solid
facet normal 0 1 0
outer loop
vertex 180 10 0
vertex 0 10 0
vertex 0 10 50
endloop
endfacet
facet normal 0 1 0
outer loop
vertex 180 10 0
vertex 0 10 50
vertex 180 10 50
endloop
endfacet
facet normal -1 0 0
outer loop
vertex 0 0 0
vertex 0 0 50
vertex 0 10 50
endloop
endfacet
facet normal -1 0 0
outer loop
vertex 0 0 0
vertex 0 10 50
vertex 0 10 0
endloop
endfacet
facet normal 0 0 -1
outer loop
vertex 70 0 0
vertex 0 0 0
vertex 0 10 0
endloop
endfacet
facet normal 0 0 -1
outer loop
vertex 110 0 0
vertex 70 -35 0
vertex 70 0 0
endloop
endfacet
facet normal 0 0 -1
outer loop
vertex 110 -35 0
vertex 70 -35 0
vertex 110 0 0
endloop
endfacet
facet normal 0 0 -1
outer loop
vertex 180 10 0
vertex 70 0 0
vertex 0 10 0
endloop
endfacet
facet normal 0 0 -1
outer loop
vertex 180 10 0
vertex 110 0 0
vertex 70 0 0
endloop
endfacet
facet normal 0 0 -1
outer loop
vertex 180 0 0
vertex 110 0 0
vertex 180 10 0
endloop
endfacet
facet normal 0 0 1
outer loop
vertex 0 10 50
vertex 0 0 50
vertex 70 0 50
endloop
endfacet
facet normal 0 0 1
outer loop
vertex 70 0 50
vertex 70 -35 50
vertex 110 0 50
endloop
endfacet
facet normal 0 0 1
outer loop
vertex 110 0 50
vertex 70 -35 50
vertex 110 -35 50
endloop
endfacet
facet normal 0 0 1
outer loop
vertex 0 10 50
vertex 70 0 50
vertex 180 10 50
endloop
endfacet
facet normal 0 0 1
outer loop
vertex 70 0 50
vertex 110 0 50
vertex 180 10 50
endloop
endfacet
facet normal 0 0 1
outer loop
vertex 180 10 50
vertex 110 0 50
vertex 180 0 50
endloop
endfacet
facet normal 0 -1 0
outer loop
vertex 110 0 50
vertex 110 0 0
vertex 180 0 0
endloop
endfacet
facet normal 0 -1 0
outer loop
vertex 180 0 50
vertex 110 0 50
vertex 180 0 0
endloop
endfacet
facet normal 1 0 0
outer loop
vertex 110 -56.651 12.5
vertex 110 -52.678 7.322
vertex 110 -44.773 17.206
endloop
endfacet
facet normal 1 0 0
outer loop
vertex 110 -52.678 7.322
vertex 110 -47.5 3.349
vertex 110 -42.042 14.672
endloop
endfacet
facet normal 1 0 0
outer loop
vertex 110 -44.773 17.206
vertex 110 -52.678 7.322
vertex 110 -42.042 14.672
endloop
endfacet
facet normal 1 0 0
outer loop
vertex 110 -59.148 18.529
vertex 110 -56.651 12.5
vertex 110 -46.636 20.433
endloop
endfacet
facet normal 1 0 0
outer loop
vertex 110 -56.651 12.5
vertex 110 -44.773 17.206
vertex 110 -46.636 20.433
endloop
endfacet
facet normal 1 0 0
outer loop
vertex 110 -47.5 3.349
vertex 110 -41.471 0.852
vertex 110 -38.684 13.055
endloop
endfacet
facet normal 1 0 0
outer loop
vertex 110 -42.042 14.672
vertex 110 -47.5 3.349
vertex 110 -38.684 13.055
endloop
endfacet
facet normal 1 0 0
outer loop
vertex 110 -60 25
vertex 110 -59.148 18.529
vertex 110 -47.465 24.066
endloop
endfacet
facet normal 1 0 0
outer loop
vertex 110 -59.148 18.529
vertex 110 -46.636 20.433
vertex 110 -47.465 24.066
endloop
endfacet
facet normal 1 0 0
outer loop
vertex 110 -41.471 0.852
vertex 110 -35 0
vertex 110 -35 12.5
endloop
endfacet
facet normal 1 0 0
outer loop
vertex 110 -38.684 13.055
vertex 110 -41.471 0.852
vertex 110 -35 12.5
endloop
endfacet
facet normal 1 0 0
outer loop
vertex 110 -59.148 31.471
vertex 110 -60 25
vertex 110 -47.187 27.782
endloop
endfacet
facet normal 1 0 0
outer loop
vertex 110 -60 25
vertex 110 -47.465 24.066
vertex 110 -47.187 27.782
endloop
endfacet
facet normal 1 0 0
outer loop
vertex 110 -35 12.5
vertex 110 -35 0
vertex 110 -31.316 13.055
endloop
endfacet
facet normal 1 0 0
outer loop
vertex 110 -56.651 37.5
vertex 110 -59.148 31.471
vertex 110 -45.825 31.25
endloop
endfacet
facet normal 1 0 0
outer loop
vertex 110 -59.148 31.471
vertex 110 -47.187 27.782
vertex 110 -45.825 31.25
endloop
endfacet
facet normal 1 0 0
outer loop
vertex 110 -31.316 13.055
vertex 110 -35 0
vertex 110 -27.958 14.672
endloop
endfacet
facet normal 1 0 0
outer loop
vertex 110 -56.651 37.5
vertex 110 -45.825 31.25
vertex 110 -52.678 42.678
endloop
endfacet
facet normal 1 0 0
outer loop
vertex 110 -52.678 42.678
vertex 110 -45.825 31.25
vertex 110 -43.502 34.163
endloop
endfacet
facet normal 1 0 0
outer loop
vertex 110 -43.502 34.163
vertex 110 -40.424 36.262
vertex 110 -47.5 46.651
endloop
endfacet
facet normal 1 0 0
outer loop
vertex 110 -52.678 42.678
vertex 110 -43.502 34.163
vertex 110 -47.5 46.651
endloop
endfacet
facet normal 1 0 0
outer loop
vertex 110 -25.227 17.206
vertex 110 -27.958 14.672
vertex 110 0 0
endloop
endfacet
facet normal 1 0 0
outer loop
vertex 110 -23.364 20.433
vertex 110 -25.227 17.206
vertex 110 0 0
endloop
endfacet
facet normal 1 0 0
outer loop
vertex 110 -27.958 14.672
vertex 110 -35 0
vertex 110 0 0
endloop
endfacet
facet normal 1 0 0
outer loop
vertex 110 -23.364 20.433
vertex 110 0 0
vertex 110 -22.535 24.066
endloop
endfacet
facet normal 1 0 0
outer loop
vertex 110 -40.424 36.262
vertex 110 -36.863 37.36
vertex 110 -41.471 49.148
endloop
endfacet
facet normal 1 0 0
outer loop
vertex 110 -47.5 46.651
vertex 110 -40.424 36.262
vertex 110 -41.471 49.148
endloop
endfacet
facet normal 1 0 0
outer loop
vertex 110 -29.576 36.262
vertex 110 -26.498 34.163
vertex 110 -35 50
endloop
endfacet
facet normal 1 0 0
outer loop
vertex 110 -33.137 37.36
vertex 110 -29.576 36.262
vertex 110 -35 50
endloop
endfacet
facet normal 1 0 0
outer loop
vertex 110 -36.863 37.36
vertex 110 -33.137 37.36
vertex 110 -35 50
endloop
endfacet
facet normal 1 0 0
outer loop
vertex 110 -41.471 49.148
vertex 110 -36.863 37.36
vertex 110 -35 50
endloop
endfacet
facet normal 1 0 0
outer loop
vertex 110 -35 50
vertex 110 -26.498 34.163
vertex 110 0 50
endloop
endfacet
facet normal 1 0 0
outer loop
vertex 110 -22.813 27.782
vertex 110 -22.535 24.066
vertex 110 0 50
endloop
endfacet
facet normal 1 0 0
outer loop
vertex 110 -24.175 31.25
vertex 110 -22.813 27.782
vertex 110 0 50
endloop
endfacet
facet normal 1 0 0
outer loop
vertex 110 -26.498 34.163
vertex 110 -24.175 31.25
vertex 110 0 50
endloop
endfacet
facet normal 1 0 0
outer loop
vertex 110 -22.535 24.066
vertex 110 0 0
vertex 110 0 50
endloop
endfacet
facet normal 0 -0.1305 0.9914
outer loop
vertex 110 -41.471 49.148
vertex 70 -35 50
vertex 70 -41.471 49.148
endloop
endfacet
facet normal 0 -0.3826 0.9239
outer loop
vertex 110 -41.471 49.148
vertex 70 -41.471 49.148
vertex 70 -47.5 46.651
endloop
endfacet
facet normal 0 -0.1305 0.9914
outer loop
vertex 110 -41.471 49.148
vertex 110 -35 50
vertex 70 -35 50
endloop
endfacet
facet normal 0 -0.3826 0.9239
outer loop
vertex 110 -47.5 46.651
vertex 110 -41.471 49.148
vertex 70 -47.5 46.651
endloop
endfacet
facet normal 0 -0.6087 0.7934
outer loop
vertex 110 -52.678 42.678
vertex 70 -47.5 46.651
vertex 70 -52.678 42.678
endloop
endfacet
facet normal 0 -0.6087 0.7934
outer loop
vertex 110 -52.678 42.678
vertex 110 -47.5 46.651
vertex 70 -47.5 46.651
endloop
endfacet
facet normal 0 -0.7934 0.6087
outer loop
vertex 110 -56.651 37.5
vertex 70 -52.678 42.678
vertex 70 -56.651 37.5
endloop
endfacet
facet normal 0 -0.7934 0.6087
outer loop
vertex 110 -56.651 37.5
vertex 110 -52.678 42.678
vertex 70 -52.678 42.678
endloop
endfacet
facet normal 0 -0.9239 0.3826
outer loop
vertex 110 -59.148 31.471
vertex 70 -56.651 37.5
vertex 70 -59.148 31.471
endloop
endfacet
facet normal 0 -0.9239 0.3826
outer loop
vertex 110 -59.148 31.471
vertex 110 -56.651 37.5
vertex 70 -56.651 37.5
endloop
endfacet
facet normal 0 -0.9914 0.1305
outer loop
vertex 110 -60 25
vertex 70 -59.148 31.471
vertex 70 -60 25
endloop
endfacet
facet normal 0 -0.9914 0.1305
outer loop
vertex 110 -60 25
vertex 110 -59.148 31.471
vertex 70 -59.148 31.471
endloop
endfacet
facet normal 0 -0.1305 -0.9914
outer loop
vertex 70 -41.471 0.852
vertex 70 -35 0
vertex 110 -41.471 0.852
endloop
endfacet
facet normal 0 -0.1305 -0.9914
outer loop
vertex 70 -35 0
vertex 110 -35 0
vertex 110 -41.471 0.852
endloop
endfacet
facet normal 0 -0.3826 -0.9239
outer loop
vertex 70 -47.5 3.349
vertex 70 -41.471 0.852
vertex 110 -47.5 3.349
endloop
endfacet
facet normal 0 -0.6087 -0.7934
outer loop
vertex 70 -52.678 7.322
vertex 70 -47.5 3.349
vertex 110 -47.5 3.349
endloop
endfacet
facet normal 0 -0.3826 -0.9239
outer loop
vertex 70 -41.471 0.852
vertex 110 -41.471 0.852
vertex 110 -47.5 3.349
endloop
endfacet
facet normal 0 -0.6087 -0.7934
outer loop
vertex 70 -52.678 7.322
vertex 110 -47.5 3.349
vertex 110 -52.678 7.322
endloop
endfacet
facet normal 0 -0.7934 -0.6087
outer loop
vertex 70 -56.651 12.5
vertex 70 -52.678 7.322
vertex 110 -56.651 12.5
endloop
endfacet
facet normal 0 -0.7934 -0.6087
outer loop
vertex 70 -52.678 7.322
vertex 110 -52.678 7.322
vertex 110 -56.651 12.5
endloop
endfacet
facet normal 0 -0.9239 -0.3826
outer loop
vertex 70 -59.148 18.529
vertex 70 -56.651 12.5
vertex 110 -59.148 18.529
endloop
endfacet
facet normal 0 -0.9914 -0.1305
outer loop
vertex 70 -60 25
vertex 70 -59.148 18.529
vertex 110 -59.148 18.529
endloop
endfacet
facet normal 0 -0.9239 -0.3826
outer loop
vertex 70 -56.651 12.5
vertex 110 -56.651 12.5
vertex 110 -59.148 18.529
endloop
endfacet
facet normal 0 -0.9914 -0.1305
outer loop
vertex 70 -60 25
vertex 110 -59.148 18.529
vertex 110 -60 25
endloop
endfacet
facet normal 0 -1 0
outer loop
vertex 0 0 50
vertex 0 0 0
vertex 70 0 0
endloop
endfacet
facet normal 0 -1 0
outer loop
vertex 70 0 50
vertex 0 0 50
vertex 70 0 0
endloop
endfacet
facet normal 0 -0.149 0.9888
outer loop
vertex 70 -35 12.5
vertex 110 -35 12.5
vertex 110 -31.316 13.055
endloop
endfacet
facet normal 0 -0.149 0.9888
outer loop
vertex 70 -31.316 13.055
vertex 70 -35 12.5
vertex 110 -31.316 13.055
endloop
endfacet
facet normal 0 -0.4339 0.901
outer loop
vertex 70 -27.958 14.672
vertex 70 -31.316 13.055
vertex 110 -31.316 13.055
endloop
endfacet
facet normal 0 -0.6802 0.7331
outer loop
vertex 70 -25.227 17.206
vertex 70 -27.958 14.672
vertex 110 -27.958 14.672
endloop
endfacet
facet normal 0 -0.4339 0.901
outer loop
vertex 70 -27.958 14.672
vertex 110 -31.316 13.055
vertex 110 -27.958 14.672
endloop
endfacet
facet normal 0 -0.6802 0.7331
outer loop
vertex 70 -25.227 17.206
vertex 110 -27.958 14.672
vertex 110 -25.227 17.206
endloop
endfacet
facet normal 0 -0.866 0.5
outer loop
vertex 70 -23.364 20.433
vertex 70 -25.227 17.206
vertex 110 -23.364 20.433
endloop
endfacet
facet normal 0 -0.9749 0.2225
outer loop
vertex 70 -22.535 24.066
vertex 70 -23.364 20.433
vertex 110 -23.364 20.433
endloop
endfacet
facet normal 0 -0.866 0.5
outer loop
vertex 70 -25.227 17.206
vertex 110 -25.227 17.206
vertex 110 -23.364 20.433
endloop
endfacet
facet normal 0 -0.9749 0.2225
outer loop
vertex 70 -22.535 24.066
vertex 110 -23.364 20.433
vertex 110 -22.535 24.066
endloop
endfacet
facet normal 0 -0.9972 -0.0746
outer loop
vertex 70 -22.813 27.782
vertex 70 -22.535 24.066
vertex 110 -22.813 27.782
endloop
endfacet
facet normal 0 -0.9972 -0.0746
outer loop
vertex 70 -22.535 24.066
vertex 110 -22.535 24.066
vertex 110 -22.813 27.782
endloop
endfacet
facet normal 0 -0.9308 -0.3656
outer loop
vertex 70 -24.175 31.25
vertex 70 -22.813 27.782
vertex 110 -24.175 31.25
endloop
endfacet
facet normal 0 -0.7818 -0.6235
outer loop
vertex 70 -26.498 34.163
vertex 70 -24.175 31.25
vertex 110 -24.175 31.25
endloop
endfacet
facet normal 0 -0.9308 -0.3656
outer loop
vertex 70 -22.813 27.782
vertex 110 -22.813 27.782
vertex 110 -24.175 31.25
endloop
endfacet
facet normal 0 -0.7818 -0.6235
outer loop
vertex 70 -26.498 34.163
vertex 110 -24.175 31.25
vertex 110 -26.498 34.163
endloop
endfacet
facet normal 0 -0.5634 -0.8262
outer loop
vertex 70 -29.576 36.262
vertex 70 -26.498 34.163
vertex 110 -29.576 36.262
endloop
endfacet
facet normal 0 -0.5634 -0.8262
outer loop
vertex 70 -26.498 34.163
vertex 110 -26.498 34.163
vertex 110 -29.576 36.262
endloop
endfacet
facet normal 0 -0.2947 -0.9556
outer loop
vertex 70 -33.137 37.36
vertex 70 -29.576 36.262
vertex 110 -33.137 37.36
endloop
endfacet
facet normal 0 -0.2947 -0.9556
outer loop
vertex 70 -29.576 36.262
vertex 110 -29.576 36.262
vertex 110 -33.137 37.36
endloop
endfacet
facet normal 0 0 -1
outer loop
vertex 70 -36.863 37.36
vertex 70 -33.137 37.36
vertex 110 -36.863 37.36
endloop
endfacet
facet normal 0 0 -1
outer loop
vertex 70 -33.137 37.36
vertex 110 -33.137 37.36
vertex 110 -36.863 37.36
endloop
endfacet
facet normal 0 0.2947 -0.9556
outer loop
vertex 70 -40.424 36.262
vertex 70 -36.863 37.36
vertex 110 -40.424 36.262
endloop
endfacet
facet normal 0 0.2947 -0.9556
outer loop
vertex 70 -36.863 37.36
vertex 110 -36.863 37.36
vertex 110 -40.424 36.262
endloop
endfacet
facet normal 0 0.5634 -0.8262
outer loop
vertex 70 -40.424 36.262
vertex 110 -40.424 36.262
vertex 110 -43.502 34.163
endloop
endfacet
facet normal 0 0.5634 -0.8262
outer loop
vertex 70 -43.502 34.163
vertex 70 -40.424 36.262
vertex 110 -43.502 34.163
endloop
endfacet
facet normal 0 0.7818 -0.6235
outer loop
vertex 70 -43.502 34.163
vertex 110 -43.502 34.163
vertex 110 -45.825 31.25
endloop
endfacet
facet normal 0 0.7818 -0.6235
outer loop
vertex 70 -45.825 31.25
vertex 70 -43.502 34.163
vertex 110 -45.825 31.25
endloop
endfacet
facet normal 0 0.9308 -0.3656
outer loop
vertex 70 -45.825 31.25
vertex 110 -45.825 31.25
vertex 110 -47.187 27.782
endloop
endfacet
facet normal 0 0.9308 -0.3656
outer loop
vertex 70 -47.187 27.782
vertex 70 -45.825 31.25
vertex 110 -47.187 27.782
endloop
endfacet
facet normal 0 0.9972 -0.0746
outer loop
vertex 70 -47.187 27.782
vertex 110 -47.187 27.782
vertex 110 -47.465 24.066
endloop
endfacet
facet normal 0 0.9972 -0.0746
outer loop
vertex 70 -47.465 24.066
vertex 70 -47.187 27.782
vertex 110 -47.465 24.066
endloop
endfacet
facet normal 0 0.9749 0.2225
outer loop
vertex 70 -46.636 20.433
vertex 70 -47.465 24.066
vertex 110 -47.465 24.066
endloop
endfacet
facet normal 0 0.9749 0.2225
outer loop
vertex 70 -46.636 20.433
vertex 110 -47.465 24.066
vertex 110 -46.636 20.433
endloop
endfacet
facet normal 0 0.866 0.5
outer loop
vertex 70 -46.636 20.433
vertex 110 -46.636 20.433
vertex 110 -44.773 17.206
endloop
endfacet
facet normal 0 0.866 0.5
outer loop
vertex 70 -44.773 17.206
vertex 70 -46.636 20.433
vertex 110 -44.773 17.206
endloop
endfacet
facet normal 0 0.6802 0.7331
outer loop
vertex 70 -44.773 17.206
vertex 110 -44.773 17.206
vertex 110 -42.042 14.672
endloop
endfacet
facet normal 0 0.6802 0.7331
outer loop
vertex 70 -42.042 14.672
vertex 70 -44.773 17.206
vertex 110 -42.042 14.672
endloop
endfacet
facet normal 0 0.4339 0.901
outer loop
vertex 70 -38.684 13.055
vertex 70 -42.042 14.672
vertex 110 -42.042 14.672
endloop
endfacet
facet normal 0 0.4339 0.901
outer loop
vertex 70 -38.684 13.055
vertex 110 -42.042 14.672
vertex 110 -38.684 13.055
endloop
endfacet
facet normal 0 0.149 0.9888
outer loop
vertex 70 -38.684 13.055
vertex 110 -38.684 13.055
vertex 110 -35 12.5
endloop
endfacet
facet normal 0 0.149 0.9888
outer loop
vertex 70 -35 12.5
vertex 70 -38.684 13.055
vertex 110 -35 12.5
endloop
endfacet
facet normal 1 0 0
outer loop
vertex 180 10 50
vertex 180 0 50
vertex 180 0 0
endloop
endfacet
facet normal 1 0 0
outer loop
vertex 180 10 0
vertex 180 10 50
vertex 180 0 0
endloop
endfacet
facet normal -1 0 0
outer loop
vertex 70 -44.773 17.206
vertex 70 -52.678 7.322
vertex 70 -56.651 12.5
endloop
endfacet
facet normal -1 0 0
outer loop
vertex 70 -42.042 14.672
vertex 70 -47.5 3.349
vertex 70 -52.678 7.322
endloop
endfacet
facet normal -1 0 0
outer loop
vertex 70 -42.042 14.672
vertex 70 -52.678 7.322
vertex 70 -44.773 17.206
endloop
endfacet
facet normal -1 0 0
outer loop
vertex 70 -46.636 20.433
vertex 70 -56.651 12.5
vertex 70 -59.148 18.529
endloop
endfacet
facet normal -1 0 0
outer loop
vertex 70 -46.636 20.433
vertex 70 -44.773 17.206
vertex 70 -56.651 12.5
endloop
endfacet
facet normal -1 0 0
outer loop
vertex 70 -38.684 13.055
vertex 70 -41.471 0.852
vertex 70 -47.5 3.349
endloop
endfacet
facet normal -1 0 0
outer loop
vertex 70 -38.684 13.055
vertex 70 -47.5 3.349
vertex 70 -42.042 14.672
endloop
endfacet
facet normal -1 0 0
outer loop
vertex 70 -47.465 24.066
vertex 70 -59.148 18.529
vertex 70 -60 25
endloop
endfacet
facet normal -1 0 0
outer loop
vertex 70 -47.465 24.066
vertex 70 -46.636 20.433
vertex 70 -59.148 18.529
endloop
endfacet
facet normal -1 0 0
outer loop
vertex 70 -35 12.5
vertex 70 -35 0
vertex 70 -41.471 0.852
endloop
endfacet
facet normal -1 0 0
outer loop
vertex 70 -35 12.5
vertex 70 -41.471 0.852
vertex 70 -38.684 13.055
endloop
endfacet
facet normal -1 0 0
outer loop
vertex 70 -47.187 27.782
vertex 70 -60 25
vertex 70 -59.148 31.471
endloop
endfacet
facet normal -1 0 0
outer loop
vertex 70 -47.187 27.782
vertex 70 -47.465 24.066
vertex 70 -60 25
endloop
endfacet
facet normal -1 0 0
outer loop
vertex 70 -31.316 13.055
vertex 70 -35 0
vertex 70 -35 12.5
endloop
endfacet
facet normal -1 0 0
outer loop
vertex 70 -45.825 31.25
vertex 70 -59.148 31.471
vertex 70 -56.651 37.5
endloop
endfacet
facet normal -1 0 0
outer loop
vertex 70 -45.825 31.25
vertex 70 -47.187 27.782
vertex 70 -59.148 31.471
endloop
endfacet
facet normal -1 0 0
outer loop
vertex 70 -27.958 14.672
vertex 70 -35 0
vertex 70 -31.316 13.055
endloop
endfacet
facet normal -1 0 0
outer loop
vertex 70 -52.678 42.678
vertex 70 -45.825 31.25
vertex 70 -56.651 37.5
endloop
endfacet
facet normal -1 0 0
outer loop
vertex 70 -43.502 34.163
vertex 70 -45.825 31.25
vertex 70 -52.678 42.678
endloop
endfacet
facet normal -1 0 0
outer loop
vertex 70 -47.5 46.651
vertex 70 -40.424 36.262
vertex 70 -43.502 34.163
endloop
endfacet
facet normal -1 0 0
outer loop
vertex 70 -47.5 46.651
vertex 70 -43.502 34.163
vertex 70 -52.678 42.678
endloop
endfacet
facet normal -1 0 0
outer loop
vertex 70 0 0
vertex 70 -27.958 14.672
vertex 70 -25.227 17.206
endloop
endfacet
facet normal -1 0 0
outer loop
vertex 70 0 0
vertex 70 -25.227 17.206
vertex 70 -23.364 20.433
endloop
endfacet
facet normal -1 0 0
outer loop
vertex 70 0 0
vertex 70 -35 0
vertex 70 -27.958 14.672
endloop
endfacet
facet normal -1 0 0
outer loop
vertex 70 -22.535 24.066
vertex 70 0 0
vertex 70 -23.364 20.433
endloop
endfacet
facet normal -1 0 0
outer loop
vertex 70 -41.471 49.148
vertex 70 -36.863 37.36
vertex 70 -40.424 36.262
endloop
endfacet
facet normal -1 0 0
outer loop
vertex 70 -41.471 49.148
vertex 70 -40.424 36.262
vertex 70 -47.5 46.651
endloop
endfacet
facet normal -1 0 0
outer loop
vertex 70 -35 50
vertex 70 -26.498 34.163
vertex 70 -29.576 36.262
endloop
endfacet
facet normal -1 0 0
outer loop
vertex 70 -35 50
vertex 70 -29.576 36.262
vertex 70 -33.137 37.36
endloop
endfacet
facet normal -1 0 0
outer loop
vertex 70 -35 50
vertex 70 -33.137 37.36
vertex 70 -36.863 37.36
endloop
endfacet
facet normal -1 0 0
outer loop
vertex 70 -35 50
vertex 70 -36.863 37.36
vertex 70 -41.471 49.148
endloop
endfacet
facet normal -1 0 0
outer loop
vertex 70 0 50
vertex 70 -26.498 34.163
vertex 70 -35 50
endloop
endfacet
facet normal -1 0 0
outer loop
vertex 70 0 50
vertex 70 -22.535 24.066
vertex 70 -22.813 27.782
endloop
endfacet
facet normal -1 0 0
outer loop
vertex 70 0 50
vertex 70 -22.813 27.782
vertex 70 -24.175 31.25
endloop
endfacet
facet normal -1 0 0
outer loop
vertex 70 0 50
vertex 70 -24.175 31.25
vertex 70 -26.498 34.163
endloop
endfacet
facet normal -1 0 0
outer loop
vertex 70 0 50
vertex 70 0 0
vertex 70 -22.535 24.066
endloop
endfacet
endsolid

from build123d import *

# Parameters (mm, degrees)
SKETCH_1_W          = 180
SKETCH_1_H          = 50
EXTRUDE_1_DEPTH     = 10
SKETCH_2_W          = 40
SKETCH_2_H          = 50
EXTRUDE_2_DEPTH     = 60
FILLET_1_R          = 25
SKETCH_3_R          = 12.5
CUT_EXTRUDE_2_DEPTH = 135.907375632


with BuildPart() as part:
    # 草图1 → 凸台-拉伸1 (new body)
    with BuildSketch(Plane(origin=(0, 0, 0), x_dir=(1, 0, 0), z_dir=(0, 1, 0))):
        with Locations((90, -25)):
            Rectangle(SKETCH_1_W, SKETCH_1_H)
    extrude(amount=EXTRUDE_1_DEPTH)

    # 草图2 → 凸台-拉伸2 (add)
    with BuildSketch(Plane.XZ):
        with Locations((90, 25)):
            Rectangle(SKETCH_2_W, SKETCH_2_H)
    extrude(amount=EXTRUDE_2_DEPTH)

    # 圆角1
    fillet_1_edges = [part.edges().sort_by_distance(p)[0] for p in [
        (90, -60, 50),
        (90, -60, 0),
    ]]
    fillet(fillet_1_edges, radius=FILLET_1_R - 0.0001)  # a hair under: the kernel refuses the full size

    # 草图3 → 切除-拉伸2 (cut, through all)
    with BuildSketch(Plane(origin=(110, 0, 0), x_dir=(0, 0, -1), z_dir=(1, 0, 0))):
        with Locations((-25, -35)):
            Circle(SKETCH_3_R)
    extrude(amount=-CUT_EXTRUDE_2_DEPTH, mode=Mode.SUBTRACT)


solid = part.part
